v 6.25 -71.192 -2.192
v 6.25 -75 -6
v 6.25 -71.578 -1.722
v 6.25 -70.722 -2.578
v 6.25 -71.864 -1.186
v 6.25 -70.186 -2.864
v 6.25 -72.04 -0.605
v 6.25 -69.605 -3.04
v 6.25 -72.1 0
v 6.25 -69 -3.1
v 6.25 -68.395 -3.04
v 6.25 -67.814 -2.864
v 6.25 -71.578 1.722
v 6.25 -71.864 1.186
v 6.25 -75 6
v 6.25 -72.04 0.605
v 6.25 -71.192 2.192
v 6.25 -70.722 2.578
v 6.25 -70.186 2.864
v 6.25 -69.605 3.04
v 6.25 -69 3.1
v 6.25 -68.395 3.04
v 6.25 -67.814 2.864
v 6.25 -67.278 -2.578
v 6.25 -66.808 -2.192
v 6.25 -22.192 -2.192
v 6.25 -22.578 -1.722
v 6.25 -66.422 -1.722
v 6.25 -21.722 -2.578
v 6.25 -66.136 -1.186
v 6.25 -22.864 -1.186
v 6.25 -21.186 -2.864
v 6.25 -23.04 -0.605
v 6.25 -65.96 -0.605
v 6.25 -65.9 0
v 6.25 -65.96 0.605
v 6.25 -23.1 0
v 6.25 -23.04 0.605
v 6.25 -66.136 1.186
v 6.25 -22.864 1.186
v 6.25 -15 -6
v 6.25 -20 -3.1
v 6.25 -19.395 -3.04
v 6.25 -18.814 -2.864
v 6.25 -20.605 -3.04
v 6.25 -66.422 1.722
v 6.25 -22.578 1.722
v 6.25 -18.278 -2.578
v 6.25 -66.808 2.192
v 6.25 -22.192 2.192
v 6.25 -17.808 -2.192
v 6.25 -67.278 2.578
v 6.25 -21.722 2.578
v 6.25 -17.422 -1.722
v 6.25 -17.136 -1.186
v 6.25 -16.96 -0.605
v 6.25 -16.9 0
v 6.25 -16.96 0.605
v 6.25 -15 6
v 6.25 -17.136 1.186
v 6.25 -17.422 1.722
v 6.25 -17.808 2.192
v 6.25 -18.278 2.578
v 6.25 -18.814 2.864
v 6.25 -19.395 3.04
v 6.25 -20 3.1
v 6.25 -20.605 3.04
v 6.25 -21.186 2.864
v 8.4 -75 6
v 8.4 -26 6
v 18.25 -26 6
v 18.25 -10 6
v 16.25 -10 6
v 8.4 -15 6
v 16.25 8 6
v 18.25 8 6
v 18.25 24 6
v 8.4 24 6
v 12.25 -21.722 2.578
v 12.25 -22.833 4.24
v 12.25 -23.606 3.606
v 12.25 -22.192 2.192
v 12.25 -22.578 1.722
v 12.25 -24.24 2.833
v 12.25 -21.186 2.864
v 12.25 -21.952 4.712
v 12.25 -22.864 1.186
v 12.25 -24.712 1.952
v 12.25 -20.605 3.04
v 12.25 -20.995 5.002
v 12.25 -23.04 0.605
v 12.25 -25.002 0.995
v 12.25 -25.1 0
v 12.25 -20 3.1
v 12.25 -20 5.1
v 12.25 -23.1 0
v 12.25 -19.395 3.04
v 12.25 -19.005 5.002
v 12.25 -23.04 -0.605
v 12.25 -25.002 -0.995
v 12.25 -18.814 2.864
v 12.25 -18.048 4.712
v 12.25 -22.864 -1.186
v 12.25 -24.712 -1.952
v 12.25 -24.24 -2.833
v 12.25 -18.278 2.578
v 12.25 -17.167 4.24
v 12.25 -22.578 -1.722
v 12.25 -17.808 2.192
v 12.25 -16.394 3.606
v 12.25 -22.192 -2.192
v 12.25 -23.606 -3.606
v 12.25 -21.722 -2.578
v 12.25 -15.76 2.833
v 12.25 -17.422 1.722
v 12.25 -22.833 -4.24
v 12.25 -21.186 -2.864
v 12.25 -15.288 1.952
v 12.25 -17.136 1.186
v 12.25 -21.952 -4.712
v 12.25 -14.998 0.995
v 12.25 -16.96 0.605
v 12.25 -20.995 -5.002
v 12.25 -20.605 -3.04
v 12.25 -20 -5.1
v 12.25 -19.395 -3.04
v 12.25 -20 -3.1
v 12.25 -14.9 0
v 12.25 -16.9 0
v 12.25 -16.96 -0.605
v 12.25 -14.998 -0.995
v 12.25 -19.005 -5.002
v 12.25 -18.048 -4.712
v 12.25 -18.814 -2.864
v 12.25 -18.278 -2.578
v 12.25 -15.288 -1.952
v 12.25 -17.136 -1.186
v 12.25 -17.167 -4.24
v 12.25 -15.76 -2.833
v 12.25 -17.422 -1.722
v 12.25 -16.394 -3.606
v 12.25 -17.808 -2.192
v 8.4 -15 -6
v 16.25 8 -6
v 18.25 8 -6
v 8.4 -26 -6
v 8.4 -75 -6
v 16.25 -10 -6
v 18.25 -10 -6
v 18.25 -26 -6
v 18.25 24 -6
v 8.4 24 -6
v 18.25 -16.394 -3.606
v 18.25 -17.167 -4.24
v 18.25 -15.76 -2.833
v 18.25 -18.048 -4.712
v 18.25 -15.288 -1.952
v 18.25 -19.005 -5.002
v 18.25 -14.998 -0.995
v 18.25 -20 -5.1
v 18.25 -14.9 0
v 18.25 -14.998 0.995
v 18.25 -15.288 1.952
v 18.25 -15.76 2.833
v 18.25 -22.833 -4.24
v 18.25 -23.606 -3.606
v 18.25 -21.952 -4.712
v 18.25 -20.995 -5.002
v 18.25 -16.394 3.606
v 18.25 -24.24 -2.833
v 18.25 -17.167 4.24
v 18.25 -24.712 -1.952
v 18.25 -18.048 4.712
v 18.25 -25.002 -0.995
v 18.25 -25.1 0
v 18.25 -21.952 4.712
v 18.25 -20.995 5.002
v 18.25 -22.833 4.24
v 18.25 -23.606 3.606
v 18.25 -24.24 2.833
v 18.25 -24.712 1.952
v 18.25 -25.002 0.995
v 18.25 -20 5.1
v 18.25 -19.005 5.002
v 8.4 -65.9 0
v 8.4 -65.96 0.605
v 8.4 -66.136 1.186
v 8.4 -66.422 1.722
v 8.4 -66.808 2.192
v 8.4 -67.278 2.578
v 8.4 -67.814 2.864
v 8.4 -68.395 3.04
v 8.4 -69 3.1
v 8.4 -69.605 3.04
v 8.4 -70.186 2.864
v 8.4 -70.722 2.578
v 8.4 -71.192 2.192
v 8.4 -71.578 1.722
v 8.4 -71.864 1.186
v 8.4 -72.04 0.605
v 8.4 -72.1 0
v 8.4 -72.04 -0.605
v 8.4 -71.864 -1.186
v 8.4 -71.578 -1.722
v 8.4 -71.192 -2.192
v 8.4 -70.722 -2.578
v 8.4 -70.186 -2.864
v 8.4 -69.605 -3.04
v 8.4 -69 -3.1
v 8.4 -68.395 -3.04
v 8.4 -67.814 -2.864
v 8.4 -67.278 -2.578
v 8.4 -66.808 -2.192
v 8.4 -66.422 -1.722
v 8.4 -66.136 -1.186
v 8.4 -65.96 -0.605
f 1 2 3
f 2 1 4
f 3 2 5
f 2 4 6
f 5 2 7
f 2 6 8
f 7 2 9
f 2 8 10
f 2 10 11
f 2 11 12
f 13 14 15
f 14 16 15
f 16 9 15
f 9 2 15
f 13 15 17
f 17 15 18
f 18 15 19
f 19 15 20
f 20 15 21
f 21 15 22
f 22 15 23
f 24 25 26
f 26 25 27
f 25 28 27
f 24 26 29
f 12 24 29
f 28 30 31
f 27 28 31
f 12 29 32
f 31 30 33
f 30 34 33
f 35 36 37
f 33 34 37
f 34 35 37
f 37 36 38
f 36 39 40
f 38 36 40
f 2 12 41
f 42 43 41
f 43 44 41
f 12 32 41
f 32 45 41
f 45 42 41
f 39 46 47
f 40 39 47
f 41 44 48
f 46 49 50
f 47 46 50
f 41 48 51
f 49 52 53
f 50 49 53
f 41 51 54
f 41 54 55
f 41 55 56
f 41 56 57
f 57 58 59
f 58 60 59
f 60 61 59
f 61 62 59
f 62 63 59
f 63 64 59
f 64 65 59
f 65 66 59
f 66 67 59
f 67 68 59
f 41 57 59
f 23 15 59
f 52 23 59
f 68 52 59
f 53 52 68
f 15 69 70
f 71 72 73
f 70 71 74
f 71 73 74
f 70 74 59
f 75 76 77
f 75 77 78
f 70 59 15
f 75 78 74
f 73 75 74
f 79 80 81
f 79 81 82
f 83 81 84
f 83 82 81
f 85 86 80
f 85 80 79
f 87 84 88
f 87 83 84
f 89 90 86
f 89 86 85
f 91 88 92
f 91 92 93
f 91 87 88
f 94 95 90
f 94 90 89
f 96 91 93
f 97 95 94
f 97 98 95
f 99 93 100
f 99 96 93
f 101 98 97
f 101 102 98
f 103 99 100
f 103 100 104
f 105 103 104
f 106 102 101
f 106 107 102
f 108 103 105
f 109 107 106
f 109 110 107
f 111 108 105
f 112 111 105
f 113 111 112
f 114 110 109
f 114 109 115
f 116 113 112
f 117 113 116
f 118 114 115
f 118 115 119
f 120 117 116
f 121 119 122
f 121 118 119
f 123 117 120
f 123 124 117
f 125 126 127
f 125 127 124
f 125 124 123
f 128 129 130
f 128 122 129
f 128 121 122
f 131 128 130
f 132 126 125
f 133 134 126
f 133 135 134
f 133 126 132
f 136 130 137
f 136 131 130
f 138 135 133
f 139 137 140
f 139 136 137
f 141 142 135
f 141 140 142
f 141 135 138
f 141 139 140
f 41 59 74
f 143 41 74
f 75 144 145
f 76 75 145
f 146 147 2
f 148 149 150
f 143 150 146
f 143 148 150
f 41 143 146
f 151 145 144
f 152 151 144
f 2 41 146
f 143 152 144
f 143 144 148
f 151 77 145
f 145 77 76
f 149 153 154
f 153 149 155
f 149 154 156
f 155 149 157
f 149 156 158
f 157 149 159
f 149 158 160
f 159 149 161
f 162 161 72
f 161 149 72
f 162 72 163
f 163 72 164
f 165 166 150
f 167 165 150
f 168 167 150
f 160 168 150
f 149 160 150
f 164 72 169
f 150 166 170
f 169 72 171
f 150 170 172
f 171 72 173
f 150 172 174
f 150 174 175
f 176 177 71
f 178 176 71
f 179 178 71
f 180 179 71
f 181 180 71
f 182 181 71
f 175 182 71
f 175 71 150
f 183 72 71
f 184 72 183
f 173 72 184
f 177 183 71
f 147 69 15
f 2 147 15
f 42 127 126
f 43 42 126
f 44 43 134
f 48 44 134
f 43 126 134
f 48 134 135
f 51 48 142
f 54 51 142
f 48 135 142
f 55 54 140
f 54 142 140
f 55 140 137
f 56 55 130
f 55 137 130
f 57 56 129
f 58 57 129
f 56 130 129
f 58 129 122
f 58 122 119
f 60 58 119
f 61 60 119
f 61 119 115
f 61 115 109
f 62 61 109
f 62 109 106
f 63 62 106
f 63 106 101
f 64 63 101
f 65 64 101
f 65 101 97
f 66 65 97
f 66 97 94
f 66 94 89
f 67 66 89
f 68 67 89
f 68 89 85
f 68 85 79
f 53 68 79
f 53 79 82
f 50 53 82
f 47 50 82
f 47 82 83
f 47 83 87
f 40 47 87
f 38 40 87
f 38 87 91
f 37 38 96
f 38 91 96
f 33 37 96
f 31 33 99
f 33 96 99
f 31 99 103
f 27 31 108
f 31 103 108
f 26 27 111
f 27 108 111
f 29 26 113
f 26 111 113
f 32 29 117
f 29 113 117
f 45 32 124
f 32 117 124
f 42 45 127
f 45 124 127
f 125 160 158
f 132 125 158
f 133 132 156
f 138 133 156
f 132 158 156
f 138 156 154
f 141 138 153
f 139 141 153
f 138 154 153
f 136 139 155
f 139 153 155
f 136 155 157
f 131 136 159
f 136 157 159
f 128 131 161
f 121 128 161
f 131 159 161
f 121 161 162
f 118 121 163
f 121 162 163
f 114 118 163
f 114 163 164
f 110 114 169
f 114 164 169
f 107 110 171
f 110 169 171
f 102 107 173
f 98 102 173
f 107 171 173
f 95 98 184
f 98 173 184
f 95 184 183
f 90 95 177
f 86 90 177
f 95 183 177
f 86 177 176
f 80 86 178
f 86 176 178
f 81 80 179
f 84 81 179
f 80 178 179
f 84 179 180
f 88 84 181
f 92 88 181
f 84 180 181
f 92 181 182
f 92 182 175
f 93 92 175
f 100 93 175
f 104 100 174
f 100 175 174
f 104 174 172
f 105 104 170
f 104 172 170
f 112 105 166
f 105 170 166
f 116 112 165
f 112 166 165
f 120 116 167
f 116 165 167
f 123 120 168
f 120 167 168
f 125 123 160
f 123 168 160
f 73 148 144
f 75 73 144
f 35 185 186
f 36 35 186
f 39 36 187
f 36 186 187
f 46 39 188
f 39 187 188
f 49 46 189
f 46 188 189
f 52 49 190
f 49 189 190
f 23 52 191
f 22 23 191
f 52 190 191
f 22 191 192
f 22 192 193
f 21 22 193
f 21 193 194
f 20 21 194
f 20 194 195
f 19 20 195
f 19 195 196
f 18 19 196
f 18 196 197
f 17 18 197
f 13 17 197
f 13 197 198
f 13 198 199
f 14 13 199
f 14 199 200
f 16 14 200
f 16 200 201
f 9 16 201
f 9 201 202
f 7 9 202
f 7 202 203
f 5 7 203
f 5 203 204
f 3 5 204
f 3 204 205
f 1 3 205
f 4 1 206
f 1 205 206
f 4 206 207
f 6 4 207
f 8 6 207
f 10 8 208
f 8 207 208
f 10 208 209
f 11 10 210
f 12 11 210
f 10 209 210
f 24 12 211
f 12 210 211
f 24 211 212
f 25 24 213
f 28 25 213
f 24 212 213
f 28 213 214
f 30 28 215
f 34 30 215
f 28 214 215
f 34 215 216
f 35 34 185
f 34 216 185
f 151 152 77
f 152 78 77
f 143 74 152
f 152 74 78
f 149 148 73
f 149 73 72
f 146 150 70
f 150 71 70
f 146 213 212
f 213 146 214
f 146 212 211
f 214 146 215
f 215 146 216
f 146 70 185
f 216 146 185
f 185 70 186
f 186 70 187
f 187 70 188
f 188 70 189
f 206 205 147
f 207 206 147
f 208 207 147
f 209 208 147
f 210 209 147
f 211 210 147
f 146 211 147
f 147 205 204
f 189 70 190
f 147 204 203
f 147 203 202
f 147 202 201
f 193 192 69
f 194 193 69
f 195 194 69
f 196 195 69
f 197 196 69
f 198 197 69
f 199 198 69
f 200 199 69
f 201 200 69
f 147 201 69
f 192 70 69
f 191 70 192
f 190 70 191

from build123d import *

# Parameters (mm, degrees)
BOSS_EXTRU_1_DEPTH           = 6
ESQUISSE2_R                  = 5.1
ENL_V_MAT_EXTRU_1_DEPTH      = 6
ESQUISSE3_R                  = 3.1
ENL_V_MAT_EXTRU_2_DEPTH      = 76.478473752
ESQUISSE4_R                  = 3.1
ENL_V_MAT_EXTRU_3_DEPTH      = 76.881634801
ENL_V_MAT_EXTRU_4_DEPTH      = 78.42133104
ENL_V_MAT_EXTRU_4_DEPTH_BACK = 78.42133104
ESQUISSE5_W                  = 13.795889793
ESQUISSE5_H                  = 18


with BuildPart() as part:
    # Esquisse1 → Boss.-Extru.1 (new, symmetric)
    with BuildSketch(Plane.XY):
        Polygon((6.25, -15), (8.4, -15), (8.4, 24), (18.25, 24), (18.25, -26), (8.4, -26), (8.4, -75), (6.25, -75), align=None)
    extrude(amount=BOSS_EXTRU_1_DEPTH, both=True)

    # Esquisse2 → Enlèv. mat.-Extru.1 (cut)
    with BuildSketch(Plane(origin=(18.25, 0, 0), x_dir=(0, 0, -1), z_dir=(1, 0, 0))):
        with Locations((0, -20)):
            Circle(ESQUISSE2_R)
    extrude(amount=-ENL_V_MAT_EXTRU_1_DEPTH, mode=Mode.SUBTRACT)

    # Esquisse3 → Enlèv. mat.-Extru.2 (cut, through all)
    with BuildSketch(Plane(origin=(12.25, 0, 0), x_dir=(0, 0, -1), z_dir=(1, 0, 0))):
        with Locations((0, -20)):
            Circle(ESQUISSE3_R)
    extrude(amount=-ENL_V_MAT_EXTRU_2_DEPTH, mode=Mode.SUBTRACT)

    # Esquisse4 → Enlèv. mat.-Extru.3 (cut, through all)
    with BuildSketch(Plane(origin=(8.4, 0, 0), x_dir=(0, 0, -1), z_dir=(1, 0, 0))):
        with Locations(Location((0, -69, 0), (0, 0, 90))):
            Circle(ESQUISSE4_R)
    extrude(amount=-ENL_V_MAT_EXTRU_3_DEPTH, mode=Mode.SUBTRACT)

    # Esquisse5 → Enlèv. mat.-Extru.4 (cut, two sides: drawn at the far end of the back side and taken through both)
    with BuildSketch(Plane.XY.offset(-ENL_V_MAT_EXTRU_4_DEPTH_BACK)):
        with Locations((23.147944897, -1)):
            Rectangle(ESQUISSE5_W, ESQUISSE5_H)
    extrude(amount=ENL_V_MAT_EXTRU_4_DEPTH + ENL_V_MAT_EXTRU_4_DEPTH_BACK, mode=Mode.SUBTRACT)


solid = part.part
